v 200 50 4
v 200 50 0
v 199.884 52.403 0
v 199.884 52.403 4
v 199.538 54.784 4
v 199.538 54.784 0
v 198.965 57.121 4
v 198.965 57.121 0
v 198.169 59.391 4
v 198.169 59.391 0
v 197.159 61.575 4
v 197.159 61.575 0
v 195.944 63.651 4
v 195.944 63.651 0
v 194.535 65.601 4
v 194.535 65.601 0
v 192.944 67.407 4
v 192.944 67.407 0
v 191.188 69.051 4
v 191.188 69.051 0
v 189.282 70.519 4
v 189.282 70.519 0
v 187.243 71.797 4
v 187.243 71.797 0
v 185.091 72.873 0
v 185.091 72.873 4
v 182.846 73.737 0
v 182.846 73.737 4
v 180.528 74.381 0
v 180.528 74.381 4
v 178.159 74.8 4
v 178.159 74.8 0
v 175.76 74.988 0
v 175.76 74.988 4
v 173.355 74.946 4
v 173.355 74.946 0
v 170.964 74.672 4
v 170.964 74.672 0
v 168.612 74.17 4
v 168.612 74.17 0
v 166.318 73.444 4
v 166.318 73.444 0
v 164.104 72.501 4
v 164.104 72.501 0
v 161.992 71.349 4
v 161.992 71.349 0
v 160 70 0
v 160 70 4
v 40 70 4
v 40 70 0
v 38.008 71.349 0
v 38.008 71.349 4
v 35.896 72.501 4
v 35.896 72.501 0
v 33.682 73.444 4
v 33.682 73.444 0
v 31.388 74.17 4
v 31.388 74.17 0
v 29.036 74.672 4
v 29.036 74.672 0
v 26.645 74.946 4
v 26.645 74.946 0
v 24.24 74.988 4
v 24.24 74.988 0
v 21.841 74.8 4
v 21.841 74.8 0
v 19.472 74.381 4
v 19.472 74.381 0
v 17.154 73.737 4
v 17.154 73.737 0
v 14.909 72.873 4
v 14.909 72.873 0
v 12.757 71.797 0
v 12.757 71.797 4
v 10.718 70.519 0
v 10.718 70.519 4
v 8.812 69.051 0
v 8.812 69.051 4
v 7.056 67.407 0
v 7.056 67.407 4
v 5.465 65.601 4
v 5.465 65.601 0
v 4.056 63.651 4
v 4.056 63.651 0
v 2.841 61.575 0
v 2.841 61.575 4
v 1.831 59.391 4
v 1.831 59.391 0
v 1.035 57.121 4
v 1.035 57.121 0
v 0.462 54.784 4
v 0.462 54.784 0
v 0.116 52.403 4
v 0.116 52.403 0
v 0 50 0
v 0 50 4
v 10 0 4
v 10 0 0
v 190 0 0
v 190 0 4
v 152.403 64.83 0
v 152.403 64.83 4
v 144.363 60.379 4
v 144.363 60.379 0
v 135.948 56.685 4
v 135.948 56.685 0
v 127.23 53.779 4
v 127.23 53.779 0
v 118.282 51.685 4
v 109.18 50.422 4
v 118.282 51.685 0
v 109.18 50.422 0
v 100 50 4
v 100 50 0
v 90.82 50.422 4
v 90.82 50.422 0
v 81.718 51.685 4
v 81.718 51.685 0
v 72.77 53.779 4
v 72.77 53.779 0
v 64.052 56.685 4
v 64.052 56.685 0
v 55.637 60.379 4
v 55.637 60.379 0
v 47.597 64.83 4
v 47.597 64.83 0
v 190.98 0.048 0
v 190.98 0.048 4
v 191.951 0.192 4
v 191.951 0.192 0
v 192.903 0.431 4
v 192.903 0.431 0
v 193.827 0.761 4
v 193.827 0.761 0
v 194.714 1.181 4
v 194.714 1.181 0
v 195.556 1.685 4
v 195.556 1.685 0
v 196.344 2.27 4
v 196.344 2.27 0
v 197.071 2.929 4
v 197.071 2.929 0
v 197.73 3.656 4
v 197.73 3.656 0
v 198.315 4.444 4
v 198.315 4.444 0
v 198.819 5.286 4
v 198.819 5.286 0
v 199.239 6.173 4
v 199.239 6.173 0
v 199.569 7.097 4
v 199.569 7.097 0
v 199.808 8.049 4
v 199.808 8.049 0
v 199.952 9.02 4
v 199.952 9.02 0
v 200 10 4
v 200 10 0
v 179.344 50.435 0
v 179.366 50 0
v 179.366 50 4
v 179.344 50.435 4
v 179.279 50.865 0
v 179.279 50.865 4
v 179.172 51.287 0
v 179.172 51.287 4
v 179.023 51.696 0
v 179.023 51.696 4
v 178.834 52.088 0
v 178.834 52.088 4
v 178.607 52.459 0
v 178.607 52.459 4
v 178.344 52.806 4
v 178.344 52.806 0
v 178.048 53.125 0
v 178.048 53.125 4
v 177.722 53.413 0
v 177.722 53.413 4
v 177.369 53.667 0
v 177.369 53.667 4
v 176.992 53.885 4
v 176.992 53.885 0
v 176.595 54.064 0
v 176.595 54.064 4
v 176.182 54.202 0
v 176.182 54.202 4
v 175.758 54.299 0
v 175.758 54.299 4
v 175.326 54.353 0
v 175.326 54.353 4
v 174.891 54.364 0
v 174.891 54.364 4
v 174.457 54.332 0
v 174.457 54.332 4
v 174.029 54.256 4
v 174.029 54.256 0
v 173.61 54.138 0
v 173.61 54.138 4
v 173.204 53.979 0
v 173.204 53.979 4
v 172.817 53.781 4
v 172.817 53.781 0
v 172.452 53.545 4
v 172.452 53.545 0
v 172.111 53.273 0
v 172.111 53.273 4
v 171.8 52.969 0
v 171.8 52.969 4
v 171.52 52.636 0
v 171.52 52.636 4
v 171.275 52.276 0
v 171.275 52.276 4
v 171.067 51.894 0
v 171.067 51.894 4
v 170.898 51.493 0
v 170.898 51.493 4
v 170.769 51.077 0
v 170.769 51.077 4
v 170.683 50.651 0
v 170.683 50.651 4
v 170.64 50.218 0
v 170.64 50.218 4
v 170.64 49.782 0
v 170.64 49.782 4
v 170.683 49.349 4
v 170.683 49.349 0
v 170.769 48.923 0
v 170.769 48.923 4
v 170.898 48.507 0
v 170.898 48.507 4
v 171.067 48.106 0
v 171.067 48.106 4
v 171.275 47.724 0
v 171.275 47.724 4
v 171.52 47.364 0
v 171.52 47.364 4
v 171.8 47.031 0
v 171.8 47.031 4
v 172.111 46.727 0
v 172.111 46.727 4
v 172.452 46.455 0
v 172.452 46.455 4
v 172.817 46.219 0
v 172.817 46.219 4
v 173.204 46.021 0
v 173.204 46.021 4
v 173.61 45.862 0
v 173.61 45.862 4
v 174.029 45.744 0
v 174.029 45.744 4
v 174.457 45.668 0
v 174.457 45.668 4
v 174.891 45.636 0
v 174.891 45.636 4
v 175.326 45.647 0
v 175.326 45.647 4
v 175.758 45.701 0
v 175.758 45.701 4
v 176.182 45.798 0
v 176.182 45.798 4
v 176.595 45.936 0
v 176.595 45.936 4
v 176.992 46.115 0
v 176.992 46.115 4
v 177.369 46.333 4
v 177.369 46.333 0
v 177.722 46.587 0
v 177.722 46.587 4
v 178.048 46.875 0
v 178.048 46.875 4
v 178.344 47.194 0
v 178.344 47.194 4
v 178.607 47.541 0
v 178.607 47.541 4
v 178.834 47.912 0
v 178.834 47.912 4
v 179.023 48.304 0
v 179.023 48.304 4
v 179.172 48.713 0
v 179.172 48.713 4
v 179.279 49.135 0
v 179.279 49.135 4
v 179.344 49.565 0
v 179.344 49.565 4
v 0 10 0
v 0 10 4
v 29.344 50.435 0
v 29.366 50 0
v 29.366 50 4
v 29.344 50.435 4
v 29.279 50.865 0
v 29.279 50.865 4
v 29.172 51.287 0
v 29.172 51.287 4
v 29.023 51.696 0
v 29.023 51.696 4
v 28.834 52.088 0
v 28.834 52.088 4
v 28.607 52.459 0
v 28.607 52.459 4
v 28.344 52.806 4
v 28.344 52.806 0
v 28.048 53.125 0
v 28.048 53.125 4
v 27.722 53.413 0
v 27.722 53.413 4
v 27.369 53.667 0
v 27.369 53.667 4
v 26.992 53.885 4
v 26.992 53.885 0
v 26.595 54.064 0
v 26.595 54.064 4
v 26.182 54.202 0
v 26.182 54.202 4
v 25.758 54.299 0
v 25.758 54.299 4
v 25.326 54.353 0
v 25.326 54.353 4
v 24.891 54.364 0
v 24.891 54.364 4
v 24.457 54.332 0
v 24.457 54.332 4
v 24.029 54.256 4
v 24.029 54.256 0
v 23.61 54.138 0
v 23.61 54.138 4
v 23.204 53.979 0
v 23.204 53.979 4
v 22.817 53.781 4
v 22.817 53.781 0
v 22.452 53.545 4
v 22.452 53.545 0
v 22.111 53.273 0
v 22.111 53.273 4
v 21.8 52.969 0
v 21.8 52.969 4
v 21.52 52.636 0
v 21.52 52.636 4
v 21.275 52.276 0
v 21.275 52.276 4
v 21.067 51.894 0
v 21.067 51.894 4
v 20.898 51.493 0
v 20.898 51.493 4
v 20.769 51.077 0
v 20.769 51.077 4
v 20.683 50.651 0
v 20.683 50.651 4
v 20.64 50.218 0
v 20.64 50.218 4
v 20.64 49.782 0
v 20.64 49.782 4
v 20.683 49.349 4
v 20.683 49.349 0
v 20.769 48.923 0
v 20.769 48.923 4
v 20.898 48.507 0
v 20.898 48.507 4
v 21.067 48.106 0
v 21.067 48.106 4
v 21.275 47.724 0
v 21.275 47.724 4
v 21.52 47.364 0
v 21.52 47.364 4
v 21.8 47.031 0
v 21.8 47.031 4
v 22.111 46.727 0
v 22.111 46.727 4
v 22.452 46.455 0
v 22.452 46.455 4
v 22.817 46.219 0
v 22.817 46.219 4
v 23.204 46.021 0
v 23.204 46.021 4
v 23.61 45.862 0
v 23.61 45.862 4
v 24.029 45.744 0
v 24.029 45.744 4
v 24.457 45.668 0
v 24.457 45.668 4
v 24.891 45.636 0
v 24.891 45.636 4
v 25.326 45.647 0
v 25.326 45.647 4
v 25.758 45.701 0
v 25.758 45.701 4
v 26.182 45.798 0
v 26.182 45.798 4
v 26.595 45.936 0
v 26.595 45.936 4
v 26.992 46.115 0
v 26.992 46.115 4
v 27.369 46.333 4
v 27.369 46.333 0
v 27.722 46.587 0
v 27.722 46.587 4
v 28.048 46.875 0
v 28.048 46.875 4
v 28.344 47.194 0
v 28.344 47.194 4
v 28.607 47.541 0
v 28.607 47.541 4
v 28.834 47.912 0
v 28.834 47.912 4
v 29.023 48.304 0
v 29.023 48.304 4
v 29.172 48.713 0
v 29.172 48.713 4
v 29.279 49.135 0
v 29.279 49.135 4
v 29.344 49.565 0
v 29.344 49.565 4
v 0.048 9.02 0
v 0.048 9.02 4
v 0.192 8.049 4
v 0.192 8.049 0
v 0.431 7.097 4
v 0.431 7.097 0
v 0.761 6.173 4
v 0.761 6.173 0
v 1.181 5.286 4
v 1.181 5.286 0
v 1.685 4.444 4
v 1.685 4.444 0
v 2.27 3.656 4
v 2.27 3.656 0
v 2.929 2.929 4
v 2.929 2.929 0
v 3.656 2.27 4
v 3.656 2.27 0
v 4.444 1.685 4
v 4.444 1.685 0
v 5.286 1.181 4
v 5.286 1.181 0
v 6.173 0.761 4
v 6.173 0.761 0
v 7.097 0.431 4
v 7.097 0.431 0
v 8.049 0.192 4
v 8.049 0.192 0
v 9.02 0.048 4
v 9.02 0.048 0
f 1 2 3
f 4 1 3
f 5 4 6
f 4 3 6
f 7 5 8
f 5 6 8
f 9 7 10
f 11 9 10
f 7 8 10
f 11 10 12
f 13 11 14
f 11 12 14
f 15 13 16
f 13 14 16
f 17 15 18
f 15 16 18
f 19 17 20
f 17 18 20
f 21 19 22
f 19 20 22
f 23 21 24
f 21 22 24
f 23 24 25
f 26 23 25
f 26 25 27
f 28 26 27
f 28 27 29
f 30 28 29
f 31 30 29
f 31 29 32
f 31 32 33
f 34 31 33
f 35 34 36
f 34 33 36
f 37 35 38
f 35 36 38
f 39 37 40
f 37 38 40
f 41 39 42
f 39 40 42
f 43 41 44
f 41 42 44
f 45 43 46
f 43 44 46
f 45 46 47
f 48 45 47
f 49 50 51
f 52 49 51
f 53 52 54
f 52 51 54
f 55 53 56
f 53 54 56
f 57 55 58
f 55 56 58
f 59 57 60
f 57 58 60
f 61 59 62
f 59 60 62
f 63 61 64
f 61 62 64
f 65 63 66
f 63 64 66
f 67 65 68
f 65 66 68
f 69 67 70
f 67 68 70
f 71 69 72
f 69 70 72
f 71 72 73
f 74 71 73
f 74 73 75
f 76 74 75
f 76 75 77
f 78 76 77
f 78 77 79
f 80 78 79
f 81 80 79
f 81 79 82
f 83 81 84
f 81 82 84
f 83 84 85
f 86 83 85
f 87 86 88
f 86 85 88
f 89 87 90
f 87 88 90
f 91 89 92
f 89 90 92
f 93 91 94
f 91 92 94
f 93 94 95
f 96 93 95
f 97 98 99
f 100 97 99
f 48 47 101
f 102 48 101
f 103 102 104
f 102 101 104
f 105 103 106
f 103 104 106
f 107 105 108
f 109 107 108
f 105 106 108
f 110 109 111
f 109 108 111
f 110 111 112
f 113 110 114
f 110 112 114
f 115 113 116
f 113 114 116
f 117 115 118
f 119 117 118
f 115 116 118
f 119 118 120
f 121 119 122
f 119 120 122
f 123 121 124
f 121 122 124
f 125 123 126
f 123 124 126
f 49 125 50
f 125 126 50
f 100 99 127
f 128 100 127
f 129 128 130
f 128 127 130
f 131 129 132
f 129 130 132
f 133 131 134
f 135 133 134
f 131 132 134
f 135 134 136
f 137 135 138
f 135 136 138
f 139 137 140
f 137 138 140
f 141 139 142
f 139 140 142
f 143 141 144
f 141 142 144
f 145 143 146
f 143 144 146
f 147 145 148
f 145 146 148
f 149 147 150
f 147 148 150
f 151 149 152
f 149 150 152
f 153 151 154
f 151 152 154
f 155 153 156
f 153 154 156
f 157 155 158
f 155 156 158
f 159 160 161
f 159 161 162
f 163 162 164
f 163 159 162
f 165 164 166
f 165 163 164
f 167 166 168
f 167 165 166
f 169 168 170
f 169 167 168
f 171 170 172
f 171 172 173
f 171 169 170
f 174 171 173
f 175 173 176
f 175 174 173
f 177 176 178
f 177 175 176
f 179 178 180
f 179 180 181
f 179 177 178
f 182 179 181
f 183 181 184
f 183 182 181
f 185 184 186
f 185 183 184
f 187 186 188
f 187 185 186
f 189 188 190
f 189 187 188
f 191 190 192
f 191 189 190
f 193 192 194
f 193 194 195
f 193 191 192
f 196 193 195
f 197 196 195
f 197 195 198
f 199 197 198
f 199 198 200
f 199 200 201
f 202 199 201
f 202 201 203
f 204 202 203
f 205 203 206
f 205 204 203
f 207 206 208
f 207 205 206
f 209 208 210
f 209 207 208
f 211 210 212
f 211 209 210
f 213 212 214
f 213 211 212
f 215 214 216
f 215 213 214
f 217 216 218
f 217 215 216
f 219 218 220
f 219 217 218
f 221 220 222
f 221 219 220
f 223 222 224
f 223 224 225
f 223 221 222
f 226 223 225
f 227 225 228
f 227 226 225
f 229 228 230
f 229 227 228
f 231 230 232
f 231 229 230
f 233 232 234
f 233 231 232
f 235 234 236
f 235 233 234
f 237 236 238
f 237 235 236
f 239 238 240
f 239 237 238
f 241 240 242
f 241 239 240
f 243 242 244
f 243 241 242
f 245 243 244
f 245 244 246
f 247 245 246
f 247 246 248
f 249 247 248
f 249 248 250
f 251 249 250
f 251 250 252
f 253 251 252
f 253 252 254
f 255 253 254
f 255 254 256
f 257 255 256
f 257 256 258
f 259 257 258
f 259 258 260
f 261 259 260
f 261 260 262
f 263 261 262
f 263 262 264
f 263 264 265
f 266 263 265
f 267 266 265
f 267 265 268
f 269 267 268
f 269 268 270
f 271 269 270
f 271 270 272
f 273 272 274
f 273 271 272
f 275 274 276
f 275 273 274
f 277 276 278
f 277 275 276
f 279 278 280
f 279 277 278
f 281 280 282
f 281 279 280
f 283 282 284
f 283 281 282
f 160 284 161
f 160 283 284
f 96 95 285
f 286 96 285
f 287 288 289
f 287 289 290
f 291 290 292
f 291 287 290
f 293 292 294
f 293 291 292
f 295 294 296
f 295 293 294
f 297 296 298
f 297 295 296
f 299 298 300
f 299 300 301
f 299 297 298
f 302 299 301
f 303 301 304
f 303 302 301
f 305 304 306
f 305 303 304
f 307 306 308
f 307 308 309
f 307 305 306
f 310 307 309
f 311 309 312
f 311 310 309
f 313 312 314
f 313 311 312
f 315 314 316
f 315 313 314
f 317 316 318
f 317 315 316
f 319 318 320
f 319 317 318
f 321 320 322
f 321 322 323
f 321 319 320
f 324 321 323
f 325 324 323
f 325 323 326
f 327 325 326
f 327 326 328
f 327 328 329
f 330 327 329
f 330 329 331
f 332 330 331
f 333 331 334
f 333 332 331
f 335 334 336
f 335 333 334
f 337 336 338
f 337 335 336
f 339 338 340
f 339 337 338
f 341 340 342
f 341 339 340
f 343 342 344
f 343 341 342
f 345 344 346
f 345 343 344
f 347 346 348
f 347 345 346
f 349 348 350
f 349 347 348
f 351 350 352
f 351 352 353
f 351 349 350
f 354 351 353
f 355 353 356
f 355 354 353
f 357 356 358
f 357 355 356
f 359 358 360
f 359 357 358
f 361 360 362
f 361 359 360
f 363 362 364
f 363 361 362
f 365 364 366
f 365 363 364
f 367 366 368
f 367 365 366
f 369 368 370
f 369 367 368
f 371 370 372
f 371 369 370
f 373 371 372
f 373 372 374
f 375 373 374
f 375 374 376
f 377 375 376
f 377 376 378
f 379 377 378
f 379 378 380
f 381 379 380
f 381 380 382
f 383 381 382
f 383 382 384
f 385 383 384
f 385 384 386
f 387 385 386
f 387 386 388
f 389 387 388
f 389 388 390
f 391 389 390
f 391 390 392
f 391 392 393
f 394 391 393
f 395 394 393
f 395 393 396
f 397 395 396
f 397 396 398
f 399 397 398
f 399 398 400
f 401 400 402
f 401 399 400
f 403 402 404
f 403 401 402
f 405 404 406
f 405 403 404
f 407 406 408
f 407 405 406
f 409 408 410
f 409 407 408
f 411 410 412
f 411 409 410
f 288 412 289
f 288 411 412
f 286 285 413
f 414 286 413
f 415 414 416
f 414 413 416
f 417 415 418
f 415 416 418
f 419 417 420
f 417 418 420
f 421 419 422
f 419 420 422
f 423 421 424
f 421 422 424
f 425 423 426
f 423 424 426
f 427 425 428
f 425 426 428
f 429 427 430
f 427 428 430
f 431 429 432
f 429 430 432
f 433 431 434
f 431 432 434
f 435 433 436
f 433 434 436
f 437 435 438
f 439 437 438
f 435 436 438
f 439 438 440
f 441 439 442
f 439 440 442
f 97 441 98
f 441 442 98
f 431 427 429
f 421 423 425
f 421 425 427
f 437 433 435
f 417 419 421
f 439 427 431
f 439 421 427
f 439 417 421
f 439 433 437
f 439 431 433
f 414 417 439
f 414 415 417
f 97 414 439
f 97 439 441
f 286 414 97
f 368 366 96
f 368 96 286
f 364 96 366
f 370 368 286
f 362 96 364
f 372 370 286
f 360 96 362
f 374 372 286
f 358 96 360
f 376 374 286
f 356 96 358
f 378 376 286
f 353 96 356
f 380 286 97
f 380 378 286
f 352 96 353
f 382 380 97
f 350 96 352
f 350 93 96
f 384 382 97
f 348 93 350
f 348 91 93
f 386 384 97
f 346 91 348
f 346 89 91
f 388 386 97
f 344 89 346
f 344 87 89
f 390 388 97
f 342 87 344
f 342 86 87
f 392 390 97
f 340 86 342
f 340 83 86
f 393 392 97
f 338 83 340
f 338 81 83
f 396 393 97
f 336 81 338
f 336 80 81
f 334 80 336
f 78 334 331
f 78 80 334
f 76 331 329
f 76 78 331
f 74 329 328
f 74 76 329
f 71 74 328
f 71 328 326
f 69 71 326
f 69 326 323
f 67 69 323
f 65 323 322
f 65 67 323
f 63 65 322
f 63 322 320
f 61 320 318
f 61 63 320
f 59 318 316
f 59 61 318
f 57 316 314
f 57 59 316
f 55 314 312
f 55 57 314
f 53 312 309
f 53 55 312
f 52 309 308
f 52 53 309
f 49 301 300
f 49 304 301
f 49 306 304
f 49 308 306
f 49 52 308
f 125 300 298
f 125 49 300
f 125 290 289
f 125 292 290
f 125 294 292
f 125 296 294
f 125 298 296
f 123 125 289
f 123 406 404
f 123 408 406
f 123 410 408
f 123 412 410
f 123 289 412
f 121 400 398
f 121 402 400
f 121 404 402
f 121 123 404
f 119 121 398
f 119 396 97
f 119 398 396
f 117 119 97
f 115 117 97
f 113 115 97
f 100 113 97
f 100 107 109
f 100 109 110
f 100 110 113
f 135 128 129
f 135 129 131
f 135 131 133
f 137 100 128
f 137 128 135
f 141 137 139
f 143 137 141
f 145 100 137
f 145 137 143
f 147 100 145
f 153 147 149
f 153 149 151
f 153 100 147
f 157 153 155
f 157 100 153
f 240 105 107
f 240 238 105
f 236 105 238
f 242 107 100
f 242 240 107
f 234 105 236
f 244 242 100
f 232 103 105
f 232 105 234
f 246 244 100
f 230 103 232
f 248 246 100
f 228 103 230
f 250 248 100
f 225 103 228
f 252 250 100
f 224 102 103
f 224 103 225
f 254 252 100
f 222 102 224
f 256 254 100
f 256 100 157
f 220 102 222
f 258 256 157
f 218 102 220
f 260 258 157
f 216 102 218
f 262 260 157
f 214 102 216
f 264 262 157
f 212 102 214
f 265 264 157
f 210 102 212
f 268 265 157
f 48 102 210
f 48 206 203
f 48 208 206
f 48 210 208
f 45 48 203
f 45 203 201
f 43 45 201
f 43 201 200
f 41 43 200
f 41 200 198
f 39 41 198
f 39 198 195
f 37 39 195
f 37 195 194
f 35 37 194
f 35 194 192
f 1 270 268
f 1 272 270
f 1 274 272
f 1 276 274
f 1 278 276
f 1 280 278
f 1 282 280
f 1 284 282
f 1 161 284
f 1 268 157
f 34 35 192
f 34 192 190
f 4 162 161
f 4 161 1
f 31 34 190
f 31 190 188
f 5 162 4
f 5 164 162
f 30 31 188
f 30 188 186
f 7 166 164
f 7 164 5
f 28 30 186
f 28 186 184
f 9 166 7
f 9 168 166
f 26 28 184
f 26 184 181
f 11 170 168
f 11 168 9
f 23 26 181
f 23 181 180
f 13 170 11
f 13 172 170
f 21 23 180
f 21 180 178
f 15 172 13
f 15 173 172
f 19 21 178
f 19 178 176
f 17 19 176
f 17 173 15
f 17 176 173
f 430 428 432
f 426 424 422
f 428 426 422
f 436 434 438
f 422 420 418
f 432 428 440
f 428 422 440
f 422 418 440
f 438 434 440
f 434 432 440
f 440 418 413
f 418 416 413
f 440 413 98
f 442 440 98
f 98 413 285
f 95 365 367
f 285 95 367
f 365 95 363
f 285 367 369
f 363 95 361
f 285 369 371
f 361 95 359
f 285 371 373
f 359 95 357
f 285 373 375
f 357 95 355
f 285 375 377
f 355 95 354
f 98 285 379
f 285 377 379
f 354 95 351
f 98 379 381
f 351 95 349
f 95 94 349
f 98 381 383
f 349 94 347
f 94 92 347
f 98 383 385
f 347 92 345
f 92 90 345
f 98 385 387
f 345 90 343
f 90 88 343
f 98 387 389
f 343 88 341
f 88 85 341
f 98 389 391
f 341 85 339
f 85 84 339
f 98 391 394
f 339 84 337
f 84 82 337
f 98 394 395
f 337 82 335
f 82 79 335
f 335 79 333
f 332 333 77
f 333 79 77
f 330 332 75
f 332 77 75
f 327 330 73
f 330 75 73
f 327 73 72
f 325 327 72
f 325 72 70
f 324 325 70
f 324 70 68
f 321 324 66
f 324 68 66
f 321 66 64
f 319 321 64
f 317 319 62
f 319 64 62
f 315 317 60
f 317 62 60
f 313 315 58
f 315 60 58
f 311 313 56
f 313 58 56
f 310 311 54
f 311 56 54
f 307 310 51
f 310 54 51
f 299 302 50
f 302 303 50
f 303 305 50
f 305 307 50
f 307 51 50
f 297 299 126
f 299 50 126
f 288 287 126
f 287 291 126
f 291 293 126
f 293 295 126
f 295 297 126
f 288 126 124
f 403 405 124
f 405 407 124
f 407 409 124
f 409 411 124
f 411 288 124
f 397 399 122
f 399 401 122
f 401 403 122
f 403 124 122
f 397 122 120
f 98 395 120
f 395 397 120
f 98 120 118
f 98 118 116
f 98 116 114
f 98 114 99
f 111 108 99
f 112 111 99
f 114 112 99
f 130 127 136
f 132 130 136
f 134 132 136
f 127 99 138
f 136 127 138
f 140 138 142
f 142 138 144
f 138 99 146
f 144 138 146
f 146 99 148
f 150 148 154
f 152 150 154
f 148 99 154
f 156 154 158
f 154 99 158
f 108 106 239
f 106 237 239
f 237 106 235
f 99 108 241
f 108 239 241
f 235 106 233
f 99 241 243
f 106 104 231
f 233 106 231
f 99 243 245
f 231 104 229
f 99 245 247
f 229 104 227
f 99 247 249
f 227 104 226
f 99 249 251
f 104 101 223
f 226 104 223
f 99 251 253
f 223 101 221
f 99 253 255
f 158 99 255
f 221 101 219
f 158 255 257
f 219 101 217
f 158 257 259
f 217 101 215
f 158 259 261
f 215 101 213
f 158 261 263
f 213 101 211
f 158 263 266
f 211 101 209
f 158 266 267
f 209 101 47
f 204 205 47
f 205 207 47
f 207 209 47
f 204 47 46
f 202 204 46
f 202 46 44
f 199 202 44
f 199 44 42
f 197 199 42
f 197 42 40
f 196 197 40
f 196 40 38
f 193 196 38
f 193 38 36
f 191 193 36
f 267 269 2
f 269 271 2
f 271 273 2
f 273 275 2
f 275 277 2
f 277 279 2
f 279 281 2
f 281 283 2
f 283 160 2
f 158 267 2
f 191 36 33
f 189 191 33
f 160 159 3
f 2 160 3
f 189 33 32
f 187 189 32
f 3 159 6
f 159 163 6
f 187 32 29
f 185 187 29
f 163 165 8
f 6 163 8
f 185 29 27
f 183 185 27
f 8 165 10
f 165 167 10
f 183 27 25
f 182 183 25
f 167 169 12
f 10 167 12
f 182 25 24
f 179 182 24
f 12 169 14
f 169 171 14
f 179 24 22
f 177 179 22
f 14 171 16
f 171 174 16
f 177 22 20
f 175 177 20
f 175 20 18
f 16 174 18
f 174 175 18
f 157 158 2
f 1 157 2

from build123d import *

# Parameters (mm, degrees)
SKETCH1_R           = 4.365625
BOSS_EXTRUDE1_DEPTH = 4


with BuildPart() as part:
    # Sketch1 → Boss-Extrude1 (new body)
    with BuildSketch(Plane.XY):
        with BuildLine():
            Line((10, 0), (190, 0))
            ThreePointArc((190, 0), (197.071067812, 2.928932188), (200, 10))
            Line((200, 10), (200, 50))
            ThreePointArc((200, 50), (186.180339887, 72.360679775), (160, 70))
            ThreePointArc((160, 70), (100, 50), (40, 70))
            ThreePointArc((40, 70), (13.819660113, 72.360679775), (0, 50))
            Line((0, 50), (0, 10))
            ThreePointArc((0, 10), (2.928932188, 2.928932188), (10, 0))
        make_face()
        with Locations((25, 50)):
            Circle(SKETCH1_R, mode=Mode.SUBTRACT)
        with Locations((175, 50)):
            Circle(SKETCH1_R, mode=Mode.SUBTRACT)
    extrude(amount=BOSS_EXTRUDE1_DEPTH)


solid = part.part
